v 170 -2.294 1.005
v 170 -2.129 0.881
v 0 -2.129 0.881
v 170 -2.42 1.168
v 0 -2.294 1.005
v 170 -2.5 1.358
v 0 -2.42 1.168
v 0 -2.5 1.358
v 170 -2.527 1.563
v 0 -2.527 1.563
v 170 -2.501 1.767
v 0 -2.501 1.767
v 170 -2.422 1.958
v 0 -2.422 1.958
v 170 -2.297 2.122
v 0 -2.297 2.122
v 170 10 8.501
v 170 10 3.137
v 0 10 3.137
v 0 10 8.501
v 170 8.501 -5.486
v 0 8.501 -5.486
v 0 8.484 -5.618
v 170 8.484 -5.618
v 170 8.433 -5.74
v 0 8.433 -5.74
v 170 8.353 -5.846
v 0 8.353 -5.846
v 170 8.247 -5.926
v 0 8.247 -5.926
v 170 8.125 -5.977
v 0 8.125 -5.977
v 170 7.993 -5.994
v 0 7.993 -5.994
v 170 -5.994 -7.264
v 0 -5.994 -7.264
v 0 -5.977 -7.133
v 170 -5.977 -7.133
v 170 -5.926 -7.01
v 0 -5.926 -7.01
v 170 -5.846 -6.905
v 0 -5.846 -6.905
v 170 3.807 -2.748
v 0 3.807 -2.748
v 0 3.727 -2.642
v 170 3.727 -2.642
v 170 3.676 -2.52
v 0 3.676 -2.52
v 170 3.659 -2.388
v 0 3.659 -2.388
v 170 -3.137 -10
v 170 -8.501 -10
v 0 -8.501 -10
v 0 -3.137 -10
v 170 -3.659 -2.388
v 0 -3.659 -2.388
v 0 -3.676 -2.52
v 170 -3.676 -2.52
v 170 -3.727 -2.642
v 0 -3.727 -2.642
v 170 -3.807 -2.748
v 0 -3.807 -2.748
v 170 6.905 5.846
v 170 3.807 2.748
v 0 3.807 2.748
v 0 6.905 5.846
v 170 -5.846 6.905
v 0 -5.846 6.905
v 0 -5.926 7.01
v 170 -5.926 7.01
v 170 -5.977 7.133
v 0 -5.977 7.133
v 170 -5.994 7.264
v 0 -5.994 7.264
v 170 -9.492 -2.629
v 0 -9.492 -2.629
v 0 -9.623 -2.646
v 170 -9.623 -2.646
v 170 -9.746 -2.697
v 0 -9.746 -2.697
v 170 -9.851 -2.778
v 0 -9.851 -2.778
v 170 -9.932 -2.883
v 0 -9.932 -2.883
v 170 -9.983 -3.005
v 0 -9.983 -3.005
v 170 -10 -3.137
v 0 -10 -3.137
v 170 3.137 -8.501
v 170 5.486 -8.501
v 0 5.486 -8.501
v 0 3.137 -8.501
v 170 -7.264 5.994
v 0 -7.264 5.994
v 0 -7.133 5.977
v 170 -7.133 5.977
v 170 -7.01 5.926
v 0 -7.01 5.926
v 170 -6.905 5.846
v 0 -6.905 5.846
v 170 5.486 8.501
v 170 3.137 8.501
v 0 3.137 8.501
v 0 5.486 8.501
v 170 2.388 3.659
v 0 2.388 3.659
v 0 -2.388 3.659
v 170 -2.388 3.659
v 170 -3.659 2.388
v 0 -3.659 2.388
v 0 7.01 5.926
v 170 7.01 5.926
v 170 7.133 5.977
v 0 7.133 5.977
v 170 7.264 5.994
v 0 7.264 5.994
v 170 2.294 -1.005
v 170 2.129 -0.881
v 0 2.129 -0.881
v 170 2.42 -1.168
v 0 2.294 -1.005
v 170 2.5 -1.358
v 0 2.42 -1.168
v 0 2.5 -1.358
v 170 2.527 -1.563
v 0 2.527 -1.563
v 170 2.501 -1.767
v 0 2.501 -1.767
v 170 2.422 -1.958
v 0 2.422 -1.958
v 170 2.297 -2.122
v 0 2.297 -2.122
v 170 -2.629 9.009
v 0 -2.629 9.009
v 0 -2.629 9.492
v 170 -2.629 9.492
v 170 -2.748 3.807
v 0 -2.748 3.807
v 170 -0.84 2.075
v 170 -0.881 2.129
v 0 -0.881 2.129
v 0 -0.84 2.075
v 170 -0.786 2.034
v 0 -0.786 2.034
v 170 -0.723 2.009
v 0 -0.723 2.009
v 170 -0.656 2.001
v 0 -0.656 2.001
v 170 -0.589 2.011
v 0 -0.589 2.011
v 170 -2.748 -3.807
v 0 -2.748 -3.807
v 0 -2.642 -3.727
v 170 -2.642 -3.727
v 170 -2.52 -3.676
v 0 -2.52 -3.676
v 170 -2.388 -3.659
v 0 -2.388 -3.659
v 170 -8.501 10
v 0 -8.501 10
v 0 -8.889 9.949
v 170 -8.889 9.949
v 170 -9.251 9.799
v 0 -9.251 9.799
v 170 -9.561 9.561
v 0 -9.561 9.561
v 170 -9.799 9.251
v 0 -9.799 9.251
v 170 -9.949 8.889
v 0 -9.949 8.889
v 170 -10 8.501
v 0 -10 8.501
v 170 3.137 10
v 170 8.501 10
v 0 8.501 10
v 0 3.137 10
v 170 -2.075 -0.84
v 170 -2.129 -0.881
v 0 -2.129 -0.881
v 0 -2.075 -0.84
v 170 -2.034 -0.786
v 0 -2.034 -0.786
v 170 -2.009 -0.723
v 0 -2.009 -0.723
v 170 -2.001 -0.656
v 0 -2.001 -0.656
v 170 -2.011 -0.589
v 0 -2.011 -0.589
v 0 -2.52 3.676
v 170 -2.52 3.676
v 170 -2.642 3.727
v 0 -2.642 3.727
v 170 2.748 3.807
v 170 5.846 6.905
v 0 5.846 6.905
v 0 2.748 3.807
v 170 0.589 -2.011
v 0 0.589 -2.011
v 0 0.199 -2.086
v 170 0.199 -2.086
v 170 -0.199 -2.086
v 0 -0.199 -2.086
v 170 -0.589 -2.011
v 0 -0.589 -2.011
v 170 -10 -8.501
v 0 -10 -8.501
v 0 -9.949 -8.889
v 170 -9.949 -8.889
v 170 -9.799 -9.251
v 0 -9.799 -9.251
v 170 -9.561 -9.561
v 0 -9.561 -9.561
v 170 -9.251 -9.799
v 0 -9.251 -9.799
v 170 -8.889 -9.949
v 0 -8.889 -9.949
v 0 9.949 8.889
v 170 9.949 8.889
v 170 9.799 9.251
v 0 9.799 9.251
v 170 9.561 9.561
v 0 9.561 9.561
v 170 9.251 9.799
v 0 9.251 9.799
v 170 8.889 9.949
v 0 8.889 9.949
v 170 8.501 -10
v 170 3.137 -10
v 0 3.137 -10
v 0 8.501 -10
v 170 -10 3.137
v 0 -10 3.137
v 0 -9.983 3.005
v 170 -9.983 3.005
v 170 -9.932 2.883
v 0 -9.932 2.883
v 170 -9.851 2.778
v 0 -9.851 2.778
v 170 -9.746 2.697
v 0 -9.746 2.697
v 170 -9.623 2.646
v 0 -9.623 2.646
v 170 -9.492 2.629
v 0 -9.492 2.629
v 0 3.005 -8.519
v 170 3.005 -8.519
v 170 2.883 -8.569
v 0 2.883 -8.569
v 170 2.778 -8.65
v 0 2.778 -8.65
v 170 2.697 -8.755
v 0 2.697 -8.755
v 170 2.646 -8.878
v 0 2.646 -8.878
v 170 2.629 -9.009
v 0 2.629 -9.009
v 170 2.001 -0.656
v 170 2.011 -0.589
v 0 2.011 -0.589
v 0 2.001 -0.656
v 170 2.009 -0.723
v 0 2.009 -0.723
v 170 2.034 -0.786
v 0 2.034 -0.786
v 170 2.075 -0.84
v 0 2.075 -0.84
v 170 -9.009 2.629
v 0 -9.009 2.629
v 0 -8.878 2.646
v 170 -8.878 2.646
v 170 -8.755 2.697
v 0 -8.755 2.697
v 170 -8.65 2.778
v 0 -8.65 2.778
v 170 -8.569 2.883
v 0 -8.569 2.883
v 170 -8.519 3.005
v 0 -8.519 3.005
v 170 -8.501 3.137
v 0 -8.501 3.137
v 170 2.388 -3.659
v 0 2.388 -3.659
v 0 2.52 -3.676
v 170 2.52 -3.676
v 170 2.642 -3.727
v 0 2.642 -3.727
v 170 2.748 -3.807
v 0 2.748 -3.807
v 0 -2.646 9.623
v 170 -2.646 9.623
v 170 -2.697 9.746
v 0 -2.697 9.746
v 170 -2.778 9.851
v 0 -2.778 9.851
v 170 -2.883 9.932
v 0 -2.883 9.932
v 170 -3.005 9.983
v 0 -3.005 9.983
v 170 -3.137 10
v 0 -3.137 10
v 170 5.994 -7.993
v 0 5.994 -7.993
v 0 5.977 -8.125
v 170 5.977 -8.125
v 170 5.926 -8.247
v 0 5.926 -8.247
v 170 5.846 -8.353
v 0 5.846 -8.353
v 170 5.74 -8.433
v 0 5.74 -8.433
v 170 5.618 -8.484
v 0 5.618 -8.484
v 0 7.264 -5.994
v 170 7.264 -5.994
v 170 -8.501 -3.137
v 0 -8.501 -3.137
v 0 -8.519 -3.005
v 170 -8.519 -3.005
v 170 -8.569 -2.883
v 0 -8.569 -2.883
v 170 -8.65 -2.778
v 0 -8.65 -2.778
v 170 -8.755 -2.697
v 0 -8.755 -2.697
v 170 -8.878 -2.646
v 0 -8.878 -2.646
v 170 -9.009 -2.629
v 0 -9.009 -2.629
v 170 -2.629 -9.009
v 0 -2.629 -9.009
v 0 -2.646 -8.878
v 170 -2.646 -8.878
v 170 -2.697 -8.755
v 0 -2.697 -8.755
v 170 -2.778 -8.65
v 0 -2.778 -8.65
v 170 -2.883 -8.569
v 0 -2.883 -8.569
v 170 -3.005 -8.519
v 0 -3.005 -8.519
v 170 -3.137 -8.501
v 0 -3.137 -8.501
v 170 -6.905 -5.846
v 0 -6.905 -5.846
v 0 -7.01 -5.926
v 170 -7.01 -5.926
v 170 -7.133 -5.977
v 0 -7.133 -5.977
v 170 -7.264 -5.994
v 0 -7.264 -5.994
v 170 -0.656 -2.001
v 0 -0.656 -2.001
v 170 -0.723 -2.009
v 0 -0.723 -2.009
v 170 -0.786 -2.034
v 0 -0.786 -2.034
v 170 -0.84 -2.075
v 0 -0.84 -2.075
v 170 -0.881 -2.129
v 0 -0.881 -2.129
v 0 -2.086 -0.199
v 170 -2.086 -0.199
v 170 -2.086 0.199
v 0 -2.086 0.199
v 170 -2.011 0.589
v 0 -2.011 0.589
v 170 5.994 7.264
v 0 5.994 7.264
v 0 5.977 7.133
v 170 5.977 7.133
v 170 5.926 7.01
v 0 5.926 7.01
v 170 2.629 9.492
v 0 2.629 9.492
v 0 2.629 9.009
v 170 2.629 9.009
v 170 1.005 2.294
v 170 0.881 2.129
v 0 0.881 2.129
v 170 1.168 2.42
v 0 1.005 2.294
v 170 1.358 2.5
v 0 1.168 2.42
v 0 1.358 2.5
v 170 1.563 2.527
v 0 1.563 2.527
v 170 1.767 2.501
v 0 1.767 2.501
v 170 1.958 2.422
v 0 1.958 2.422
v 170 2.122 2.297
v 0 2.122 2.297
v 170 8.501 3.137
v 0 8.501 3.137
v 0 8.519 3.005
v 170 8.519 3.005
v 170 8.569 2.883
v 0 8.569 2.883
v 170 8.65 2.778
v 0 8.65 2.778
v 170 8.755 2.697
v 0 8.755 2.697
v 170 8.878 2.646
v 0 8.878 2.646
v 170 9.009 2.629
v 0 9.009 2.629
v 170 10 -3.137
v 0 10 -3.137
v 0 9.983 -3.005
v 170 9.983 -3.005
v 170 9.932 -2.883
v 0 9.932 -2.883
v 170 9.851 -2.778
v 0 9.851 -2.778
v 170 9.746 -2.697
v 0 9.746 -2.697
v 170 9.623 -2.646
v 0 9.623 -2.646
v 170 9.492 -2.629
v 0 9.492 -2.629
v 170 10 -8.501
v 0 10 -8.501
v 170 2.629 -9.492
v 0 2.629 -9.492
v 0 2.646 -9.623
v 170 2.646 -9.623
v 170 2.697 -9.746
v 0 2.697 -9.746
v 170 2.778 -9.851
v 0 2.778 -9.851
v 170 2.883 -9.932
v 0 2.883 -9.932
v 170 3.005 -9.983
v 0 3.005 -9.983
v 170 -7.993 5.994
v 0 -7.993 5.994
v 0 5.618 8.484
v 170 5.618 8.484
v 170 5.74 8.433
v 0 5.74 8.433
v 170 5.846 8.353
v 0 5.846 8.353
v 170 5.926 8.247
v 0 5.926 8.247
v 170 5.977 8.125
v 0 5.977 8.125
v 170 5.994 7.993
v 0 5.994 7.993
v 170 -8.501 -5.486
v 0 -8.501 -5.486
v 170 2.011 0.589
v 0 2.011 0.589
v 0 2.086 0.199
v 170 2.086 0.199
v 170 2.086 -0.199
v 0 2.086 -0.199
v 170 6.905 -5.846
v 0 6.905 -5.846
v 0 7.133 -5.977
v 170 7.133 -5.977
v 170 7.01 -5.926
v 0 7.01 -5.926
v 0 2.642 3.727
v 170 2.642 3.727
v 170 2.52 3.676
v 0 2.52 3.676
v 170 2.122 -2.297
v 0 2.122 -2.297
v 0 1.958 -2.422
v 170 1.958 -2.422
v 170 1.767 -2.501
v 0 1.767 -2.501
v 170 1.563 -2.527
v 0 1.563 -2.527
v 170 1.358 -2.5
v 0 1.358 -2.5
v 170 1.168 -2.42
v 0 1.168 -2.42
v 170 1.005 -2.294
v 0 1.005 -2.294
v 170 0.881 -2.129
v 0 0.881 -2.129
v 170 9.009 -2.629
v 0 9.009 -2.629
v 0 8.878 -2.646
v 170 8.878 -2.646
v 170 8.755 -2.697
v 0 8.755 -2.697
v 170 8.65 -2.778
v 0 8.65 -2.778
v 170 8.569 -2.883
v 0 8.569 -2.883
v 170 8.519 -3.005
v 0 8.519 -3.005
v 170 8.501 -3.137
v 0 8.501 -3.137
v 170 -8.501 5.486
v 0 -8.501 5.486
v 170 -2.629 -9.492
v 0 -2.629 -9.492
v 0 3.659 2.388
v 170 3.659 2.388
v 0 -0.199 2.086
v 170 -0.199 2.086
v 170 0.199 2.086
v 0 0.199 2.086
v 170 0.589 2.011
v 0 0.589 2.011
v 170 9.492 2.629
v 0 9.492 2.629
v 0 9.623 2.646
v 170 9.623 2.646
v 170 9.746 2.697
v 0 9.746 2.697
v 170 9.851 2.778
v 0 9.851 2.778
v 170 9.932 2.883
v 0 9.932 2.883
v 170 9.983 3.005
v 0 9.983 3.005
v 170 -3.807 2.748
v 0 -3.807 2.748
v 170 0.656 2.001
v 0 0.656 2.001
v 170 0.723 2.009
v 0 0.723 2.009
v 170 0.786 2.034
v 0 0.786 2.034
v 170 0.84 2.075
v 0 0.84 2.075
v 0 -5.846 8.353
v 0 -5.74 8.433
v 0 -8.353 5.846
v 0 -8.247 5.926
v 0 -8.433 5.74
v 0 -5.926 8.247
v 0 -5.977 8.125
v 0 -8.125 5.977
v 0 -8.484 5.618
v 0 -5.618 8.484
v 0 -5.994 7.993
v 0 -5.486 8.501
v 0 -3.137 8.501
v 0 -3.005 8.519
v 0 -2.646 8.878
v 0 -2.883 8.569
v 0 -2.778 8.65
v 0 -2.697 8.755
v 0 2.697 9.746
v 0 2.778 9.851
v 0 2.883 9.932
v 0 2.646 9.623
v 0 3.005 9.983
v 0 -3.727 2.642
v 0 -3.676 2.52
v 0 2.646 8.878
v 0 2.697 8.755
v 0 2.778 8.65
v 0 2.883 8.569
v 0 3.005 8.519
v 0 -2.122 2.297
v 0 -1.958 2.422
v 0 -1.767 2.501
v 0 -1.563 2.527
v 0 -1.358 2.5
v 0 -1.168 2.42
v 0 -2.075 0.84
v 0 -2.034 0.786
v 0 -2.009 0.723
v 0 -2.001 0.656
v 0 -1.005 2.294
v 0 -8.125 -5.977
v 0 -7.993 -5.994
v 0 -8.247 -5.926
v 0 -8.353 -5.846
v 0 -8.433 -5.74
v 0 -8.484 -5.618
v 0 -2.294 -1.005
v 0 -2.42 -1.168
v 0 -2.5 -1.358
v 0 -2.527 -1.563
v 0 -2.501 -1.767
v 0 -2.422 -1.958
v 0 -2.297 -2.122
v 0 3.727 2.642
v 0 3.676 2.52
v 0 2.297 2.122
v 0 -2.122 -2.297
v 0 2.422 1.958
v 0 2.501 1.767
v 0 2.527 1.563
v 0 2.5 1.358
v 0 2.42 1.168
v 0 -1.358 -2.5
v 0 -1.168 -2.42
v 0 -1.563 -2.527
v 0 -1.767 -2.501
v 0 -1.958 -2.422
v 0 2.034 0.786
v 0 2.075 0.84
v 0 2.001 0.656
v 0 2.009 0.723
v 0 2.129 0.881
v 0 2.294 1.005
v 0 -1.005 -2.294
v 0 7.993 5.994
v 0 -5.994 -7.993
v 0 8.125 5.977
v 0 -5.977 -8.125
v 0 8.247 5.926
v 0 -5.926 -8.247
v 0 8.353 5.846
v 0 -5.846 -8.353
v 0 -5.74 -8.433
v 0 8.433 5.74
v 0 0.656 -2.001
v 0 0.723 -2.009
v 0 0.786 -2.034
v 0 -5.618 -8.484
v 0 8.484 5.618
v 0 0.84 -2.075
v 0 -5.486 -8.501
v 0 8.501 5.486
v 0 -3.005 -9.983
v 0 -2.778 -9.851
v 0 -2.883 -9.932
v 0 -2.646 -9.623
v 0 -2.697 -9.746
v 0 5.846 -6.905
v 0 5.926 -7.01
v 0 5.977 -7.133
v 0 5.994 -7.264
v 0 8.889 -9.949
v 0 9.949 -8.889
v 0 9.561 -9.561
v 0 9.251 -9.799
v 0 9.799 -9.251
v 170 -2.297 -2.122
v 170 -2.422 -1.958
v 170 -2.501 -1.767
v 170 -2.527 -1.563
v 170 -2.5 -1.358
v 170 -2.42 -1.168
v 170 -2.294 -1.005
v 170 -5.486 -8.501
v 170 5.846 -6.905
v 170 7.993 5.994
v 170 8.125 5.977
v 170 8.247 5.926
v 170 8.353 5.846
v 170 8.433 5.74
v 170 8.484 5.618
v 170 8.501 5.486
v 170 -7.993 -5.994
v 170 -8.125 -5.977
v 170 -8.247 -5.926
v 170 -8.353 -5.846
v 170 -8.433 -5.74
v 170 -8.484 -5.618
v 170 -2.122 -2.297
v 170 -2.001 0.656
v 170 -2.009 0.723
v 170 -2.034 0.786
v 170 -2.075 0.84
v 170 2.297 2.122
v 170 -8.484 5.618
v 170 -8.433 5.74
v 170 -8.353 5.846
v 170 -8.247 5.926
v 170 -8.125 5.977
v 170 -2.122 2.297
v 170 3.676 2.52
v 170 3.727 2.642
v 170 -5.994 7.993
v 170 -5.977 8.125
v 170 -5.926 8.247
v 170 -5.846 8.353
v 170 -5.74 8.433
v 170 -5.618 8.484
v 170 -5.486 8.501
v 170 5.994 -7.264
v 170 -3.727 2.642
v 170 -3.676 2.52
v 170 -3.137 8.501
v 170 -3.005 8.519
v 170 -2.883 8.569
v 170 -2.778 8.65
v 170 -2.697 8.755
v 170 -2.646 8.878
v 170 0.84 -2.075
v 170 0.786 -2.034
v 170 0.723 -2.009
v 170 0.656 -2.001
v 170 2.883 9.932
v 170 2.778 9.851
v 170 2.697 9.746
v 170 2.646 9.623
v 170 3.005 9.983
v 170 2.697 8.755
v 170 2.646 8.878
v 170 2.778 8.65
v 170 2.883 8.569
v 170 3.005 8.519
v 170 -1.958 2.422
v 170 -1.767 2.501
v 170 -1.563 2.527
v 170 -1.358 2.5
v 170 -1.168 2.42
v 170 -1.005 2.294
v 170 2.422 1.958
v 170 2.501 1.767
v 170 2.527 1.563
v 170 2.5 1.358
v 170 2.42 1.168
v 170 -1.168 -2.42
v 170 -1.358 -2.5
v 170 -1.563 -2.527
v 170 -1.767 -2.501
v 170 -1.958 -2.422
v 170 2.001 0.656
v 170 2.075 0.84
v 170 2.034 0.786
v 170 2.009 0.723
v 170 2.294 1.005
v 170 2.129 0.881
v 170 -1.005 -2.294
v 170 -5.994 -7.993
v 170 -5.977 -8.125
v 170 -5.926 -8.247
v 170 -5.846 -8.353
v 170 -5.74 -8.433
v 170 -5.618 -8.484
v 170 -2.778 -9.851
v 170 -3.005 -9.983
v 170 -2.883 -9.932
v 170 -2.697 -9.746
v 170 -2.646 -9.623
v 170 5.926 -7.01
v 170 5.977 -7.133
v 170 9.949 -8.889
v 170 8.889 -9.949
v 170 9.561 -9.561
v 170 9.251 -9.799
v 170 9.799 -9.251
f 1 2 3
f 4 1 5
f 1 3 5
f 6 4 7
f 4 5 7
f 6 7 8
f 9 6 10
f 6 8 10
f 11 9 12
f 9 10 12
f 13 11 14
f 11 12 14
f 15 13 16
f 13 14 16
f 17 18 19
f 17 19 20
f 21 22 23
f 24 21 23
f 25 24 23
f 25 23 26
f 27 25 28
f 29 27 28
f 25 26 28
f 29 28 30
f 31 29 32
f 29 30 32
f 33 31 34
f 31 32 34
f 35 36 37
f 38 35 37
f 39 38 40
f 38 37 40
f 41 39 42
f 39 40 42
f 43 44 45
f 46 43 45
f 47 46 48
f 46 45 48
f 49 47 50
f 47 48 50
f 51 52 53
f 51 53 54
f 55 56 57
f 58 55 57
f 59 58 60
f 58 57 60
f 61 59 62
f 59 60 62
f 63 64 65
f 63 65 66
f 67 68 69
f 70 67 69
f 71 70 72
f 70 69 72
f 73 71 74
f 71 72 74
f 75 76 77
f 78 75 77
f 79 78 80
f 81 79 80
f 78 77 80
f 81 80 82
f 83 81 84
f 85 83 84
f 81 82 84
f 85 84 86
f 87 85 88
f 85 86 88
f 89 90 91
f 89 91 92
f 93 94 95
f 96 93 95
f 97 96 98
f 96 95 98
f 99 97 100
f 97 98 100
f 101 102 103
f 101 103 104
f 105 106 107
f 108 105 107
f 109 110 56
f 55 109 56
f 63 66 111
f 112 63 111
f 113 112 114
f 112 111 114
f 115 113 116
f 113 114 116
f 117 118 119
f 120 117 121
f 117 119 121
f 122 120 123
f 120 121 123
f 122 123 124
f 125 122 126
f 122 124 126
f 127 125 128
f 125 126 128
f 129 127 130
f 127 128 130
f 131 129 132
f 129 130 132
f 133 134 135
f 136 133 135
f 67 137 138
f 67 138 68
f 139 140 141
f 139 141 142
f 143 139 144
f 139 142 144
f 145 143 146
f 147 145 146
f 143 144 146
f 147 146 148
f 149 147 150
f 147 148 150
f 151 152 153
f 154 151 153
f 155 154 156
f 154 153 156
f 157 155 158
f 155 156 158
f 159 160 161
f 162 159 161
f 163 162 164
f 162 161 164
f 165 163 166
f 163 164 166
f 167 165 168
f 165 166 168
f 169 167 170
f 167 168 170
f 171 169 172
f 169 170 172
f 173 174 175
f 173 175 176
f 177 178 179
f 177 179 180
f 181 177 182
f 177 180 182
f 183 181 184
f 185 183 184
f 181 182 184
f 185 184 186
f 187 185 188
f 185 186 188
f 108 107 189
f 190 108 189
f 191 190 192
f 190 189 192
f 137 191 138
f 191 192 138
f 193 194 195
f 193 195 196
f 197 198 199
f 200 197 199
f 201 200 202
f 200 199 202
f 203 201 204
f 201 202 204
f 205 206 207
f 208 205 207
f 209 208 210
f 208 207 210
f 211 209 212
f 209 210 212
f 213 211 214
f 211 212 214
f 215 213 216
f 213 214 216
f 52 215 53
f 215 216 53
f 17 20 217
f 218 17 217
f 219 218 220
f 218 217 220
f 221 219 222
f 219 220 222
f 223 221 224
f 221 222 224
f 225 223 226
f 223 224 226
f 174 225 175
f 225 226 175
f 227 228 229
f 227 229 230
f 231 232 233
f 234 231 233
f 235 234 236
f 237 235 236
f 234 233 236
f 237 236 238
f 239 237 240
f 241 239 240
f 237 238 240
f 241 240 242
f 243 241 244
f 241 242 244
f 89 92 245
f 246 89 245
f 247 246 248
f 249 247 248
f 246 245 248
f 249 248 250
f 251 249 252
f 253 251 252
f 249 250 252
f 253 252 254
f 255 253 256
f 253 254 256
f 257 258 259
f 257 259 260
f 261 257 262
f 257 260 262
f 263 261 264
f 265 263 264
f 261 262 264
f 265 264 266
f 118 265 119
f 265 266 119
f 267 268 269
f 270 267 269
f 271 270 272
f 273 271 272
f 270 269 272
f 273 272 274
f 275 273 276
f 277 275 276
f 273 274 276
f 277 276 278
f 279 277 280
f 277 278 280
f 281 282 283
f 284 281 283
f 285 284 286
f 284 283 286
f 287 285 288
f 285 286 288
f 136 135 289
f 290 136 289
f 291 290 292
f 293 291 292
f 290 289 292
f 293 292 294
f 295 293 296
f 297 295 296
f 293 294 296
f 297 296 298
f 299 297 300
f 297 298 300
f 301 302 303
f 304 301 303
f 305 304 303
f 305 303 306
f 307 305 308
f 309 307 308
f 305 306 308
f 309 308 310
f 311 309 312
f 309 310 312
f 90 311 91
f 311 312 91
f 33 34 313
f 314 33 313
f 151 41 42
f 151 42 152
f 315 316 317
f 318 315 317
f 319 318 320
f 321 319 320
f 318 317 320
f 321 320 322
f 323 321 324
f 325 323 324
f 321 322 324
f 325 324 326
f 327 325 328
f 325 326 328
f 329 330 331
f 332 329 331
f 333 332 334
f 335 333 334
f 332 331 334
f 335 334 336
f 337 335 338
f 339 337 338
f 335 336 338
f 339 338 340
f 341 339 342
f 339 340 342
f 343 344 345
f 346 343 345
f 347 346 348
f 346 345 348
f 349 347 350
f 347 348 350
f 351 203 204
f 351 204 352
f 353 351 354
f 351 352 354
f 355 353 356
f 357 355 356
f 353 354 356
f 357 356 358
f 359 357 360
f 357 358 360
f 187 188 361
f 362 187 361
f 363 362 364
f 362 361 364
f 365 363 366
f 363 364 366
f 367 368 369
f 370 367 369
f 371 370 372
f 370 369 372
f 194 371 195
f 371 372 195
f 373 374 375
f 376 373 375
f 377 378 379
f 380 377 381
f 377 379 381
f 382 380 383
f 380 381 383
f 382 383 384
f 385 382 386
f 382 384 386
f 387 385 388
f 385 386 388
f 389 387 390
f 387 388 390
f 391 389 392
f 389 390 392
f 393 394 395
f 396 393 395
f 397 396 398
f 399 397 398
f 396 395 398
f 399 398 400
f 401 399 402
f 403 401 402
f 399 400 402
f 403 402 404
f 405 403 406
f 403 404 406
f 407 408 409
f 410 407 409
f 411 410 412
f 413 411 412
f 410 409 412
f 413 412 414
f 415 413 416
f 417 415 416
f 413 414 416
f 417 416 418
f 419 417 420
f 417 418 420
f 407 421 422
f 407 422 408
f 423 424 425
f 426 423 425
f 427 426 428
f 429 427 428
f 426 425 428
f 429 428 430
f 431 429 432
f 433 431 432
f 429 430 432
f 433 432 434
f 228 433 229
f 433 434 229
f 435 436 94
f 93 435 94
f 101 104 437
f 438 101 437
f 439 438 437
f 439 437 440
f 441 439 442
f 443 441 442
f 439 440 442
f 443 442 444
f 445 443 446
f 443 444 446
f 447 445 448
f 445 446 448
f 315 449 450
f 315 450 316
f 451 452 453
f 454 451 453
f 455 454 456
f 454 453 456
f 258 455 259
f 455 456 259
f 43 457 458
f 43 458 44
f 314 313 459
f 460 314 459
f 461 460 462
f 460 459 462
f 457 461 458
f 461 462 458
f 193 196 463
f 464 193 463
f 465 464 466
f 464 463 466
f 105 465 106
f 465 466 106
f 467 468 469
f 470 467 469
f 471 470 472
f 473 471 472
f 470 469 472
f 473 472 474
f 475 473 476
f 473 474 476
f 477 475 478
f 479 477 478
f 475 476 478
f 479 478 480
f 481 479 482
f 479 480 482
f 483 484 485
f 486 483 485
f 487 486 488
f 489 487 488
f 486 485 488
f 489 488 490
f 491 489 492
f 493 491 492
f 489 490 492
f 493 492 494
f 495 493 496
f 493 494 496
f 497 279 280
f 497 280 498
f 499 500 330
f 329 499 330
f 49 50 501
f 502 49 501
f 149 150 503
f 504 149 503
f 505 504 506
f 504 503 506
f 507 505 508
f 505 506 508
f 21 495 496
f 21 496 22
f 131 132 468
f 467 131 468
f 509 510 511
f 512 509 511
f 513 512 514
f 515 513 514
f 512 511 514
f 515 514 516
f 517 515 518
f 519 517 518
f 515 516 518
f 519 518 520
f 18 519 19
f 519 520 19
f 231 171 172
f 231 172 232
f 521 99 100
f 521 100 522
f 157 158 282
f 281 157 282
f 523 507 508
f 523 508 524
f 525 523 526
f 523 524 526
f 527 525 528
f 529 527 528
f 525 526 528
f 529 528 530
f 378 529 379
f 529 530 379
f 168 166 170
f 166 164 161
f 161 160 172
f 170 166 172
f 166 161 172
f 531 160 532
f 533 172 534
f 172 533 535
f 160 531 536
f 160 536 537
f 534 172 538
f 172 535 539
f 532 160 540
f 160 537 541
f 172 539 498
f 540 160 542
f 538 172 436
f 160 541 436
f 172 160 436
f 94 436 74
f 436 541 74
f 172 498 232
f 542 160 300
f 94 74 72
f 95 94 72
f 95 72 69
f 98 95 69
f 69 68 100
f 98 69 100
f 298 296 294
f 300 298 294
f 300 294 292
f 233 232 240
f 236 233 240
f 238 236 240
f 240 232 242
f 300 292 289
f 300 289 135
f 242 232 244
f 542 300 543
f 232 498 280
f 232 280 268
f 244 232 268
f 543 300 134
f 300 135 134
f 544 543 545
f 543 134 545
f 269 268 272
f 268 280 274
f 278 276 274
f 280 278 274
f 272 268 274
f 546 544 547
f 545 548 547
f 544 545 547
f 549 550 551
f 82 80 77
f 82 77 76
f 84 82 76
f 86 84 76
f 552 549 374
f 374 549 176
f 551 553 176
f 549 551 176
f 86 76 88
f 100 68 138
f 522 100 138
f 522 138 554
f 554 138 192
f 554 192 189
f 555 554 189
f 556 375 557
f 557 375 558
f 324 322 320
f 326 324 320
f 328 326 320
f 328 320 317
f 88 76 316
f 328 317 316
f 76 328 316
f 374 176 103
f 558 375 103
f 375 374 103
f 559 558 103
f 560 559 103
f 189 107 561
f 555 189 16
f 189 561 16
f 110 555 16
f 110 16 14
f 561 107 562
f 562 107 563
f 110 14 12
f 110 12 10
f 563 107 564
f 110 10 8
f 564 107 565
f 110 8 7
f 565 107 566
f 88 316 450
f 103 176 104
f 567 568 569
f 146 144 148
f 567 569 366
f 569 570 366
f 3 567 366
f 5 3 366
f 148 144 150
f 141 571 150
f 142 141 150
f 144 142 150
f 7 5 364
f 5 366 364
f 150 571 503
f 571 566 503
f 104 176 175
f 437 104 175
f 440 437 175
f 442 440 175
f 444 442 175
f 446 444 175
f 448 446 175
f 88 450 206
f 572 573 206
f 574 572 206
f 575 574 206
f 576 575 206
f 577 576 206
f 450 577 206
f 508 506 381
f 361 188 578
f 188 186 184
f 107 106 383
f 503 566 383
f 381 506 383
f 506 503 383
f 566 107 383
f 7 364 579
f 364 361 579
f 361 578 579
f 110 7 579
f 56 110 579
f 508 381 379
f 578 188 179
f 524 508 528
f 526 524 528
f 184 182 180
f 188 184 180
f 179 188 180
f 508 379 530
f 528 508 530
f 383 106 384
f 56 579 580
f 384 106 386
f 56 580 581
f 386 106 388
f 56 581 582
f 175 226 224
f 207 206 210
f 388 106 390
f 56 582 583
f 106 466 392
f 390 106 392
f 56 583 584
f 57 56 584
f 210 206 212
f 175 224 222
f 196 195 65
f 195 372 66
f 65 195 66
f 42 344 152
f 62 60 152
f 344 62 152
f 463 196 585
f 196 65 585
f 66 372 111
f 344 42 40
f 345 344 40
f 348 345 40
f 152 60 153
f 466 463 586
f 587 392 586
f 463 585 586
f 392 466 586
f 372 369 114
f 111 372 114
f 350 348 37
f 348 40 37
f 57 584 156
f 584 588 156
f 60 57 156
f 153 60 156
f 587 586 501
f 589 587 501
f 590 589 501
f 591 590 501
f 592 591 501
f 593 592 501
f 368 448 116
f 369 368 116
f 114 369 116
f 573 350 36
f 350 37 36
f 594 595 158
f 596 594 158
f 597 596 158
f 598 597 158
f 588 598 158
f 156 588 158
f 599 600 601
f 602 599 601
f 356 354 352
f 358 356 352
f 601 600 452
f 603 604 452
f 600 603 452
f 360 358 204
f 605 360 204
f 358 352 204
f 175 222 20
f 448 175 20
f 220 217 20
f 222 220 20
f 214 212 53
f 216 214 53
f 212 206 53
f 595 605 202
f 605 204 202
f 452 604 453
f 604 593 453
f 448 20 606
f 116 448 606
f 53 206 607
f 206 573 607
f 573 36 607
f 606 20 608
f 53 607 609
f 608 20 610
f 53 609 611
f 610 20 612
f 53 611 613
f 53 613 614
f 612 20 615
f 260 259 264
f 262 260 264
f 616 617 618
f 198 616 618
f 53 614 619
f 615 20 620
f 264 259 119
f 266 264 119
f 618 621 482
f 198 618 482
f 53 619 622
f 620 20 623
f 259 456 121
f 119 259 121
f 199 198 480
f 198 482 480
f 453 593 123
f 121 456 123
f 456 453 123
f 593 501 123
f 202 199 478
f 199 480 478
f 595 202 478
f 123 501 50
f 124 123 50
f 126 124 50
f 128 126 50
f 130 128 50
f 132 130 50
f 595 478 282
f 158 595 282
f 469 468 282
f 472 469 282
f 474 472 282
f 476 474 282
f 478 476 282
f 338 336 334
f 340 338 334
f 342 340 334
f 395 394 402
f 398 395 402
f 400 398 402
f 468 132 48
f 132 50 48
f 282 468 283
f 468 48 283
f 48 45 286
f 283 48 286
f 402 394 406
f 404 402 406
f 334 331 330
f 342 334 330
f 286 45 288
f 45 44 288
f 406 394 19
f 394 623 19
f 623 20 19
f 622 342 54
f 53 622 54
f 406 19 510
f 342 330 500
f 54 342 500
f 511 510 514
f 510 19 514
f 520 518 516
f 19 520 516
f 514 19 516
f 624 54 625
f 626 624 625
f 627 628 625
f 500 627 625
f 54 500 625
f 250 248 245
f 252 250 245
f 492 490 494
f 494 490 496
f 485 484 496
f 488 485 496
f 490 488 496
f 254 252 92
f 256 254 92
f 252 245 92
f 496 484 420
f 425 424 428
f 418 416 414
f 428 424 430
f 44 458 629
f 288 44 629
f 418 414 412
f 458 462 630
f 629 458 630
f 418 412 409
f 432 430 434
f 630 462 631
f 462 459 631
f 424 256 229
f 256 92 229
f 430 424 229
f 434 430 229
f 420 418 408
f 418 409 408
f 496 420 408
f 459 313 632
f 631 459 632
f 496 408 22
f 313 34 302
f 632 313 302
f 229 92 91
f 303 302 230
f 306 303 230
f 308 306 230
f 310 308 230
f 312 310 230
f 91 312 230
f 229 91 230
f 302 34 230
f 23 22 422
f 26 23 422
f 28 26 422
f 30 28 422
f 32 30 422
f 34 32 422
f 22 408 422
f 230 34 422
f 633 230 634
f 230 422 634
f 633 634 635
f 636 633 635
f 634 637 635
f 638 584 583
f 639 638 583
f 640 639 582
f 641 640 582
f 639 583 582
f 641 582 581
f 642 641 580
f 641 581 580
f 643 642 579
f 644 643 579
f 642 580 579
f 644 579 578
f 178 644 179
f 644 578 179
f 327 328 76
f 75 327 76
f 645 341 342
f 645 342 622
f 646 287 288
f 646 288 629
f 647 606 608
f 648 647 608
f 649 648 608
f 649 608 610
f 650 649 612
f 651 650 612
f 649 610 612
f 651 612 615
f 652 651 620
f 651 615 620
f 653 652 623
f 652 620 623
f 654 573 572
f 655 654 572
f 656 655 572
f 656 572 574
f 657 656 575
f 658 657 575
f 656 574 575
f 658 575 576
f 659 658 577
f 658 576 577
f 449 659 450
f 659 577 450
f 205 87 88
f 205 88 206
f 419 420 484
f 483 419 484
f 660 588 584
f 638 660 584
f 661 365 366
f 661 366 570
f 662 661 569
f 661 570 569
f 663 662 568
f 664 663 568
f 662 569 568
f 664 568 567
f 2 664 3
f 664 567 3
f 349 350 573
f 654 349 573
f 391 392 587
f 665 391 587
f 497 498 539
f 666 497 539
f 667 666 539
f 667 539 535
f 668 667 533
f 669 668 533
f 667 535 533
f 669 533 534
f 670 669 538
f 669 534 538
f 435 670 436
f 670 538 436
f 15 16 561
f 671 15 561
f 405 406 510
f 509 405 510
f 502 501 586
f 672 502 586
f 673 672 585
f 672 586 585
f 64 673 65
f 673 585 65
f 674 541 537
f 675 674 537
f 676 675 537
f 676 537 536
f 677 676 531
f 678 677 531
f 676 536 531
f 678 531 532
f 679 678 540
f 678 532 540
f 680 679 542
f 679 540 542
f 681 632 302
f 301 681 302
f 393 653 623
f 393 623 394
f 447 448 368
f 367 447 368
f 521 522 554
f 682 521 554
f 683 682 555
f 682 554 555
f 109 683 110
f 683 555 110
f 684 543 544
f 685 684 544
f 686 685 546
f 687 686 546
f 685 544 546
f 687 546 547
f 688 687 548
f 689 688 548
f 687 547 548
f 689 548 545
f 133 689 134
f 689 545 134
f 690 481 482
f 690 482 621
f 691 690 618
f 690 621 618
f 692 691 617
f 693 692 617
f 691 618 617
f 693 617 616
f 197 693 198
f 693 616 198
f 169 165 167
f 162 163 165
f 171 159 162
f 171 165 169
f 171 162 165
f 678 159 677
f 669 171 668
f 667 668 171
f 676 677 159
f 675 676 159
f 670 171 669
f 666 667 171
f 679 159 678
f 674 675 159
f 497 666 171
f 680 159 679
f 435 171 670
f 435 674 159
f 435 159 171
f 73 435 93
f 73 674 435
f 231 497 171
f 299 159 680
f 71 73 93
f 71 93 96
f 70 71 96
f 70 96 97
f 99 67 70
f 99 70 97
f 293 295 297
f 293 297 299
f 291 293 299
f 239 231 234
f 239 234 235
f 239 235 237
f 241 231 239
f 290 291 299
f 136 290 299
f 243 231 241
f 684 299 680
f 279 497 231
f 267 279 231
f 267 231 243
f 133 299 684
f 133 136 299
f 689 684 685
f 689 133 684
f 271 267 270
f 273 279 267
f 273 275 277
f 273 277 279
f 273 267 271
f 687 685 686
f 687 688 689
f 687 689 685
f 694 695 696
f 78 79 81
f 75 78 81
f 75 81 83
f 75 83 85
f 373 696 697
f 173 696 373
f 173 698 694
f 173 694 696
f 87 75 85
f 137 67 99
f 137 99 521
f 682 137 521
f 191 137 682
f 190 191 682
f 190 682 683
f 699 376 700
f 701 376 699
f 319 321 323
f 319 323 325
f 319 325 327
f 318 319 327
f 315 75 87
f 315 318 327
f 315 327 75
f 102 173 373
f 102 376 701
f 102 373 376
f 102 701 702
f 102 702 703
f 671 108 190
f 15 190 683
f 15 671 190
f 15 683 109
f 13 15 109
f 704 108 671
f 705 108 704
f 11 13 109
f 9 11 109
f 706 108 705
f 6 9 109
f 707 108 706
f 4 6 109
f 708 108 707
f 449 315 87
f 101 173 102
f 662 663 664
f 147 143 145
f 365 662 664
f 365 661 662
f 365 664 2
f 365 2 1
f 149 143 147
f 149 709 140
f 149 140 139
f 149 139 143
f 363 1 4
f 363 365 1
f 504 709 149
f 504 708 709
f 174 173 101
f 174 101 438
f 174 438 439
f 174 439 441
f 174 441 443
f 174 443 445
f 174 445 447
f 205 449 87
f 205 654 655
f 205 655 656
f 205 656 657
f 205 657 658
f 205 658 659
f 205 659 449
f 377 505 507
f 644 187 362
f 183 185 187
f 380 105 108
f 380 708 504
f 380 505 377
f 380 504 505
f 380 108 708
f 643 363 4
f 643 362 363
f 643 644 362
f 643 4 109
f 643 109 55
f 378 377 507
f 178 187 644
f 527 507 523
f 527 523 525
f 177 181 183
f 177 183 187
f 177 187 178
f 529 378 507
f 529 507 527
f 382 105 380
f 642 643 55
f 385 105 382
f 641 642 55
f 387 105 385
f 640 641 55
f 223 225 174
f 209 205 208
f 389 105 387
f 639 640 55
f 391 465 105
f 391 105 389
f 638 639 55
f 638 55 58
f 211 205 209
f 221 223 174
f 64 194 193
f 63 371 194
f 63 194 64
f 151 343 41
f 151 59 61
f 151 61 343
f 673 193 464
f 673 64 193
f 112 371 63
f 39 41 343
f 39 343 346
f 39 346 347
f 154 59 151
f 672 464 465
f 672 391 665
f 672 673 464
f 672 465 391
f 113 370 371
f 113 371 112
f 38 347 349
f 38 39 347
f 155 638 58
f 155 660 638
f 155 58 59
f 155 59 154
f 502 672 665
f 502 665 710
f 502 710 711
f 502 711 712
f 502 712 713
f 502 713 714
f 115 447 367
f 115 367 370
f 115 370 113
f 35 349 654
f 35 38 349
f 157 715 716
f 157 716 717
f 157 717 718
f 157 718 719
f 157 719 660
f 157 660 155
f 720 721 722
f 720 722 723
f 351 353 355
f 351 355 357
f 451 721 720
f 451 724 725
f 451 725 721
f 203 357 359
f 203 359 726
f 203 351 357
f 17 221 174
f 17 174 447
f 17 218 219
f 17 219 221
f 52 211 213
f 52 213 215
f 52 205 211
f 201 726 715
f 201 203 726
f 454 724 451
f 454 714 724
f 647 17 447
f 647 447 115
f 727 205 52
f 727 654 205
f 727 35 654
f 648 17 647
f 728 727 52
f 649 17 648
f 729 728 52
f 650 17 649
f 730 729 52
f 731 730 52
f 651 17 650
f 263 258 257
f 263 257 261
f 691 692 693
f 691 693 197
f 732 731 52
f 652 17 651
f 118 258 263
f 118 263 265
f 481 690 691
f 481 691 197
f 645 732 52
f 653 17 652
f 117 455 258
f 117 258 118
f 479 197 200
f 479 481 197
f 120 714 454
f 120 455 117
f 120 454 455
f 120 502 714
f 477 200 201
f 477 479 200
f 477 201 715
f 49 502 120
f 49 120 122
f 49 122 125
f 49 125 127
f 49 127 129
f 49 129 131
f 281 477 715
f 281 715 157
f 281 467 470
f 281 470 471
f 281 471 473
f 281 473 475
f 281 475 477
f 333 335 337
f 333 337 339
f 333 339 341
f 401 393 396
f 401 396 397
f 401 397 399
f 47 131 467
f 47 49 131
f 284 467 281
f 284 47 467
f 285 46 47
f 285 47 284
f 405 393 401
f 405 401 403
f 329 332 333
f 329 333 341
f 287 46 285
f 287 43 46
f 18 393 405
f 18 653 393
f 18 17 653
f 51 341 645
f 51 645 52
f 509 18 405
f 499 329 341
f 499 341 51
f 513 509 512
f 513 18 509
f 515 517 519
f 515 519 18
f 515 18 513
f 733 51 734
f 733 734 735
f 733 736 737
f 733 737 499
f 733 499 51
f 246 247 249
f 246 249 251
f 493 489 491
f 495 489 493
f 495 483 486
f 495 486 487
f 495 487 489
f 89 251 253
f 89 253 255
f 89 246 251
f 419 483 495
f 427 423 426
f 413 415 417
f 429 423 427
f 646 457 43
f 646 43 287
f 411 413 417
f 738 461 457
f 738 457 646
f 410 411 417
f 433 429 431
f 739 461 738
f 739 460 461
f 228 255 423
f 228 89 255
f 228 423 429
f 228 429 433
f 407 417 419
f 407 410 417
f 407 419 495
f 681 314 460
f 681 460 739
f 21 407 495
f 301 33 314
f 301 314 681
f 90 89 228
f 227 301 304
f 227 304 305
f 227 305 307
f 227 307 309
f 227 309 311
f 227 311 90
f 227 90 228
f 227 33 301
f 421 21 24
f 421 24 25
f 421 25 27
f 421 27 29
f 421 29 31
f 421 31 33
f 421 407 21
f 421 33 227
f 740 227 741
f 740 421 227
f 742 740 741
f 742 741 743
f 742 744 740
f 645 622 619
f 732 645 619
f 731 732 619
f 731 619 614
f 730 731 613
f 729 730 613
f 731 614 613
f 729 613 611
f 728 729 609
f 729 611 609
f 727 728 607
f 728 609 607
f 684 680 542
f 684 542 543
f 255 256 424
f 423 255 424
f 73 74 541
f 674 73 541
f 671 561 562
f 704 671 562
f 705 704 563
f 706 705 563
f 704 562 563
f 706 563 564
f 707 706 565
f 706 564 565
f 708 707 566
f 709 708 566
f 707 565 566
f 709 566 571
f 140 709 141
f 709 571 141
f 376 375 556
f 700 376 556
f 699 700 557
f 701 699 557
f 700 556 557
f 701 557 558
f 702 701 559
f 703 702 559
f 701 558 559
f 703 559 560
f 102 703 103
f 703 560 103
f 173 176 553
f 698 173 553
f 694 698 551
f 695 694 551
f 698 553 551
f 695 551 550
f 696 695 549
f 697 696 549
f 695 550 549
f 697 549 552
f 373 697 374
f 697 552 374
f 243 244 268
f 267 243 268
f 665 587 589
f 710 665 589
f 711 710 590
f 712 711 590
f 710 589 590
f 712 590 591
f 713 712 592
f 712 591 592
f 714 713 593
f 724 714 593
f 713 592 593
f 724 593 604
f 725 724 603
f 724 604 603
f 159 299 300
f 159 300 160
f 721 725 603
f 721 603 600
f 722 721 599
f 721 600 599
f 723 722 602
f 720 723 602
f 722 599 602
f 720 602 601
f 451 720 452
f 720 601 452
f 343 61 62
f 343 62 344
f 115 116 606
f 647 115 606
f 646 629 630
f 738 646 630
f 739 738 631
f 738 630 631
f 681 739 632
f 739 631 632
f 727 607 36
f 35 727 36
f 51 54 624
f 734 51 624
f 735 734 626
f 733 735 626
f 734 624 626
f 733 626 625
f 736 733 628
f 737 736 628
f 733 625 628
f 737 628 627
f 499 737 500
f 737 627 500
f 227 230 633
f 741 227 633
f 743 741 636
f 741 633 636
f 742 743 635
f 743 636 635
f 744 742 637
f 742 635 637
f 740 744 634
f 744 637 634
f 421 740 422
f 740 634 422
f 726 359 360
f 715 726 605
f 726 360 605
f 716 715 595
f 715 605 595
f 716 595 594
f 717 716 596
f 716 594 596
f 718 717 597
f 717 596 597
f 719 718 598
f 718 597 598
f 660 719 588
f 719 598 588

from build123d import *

# Parameters (mm, degrees)
F_20_SERIES_20_2020_1_DEPTH = 170


with BuildPart() as part:
    # Sketch11 → 20_series 20-2020(1) (new body)
    with BuildSketch(Plane(origin=(0, 0, 0), x_dir=(0, 0, -1), z_dir=(1, 0, 0))):
        with BuildLine():
            Line((9.0094, 2.6289), (9.492, 2.6289))
            ThreePointArc((9.492, 2.6289), (9.851210245, 2.777689755), (10, 3.1369))
            Line((10, 3.1369), (10, 8.5014))
            ThreePointArc((10, 8.5014), (9.561070222, 9.561070222), (8.5014, 10))
            Line((8.5014, 10), (3.1369, 10))
            ThreePointArc((3.1369, 10), (2.777689755, 9.851210245), (2.6289, 9.492))
            Line((2.6289, 9.492), (2.6289, 9.0094))
            ThreePointArc((2.6289, 9.0094), (2.777689755, 8.650189755), (3.1369, 8.5014))
            Line((3.1369, 8.5014), (5.4864, 8.5014))
            ThreePointArc((5.4864, 8.5014), (5.845610245, 8.352610245), (5.9944, 7.9934))
            Line((5.9944, 7.9934), (5.9944, 7.264490712))
            ThreePointArc((5.9944, 7.264490712), (5.955730803, 7.070087528), (5.845610245, 6.905280467))
            Line((5.845610245, 6.905280467), (2.747686782, 3.807357004))
            ThreePointArc((2.747686782, 3.807357004), (2.582879721, 3.697236446), (2.388476537, 3.658567249))
            Line((2.388476537, 3.658567249), (-2.388476537, 3.658567249))
            ThreePointArc((-2.388476537, 3.658567249), (-2.582879721, 3.697236446), (-2.747686782, 3.807357004))
            Line((-2.747686782, 3.807357004), (-5.845610245, 6.905280467))
            ThreePointArc((-5.845610245, 6.905280467), (-5.955730803, 7.070087528), (-5.9944, 7.264490712))
            Line((-5.9944, 7.264490712), (-5.9944, 7.9934))
            ThreePointArc((-5.9944, 7.9934), (-5.845610245, 8.352610245), (-5.4864, 8.5014))
            Line((-5.4864, 8.5014), (-3.1369, 8.5014))
            ThreePointArc((-3.1369, 8.5014), (-2.777689755, 8.650189755), (-2.6289, 9.0094))
            Line((-2.6289, 9.0094), (-2.6289, 9.492))
            ThreePointArc((-2.6289, 9.492), (-2.777689755, 9.851210245), (-3.1369, 10))
            Line((-3.1369, 10), (-8.5014, 10))
            ThreePointArc((-8.5014, 10), (-9.561070222, 9.561070222), (-10, 8.5014))
            Line((-10, 8.5014), (-10, 3.1369))
            ThreePointArc((-10, 3.1369), (-9.851210245, 2.777689755), (-9.492, 2.6289))
            Line((-9.492, 2.6289), (-9.0094, 2.6289))
            ThreePointArc((-9.0094, 2.6289), (-8.650189755, 2.777689755), (-8.5014, 3.1369))
            Line((-8.5014, 3.1369), (-8.5014, 5.4864))
            ThreePointArc((-8.5014, 5.4864), (-8.352610245, 5.845610245), (-7.9934, 5.9944))
            Line((-7.9934, 5.9944), (-7.264490712, 5.9944))
            ThreePointArc((-7.264490712, 5.9944), (-7.070087528, 5.955730803), (-6.905280467, 5.845610245))
            Line((-6.905280467, 5.845610245), (-3.807357004, 2.747686782))
            ThreePointArc((-3.807357004, 2.747686782), (-3.697236446, 2.582879721), (-3.658567249, 2.388476537))
            Line((-3.658567249, 2.388476537), (-3.658567249, -2.388476537))
            ThreePointArc((-3.658567249, -2.388476537), (-3.697236446, -2.582879721), (-3.807357004, -2.747686782))
            Line((-3.807357004, -2.747686782), (-6.905280467, -5.845610245))
            ThreePointArc((-6.905280467, -5.845610245), (-7.070087528, -5.955730803), (-7.264490712, -5.9944))
            Line((-7.264490712, -5.9944), (-7.9934, -5.9944))
            ThreePointArc((-7.9934, -5.9944), (-8.352610245, -5.845610245), (-8.5014, -5.4864))
            Line((-8.5014, -5.4864), (-8.5014, -3.1369))
            ThreePointArc((-8.5014, -3.1369), (-8.650189755, -2.777689755), (-9.0094, -2.6289))
            Line((-9.0094, -2.6289), (-9.492, -2.6289))
            ThreePointArc((-9.492, -2.6289), (-9.851210245, -2.777689755), (-10, -3.1369))
            Line((-10, -3.1369), (-10, -8.5014))
            ThreePointArc((-10, -8.5014), (-9.561070222, -9.561070222), (-8.5014, -10))
            Line((-8.5014, -10), (-3.1369, -10))
            ThreePointArc((-3.1369, -10), (-2.777689755, -9.851210245), (-2.6289, -9.492))
            Line((-2.6289, -9.492), (-2.6289, -9.0094))
            ThreePointArc((-2.6289, -9.0094), (-2.777689755, -8.650189755), (-3.1369, -8.5014))
            Line((-3.1369, -8.5014), (-5.4864, -8.5014))
            ThreePointArc((-5.4864, -8.5014), (-5.845610245, -8.352610245), (-5.9944, -7.9934))
            Line((-5.9944, -7.9934), (-5.9944, -7.264490712))
            ThreePointArc((-5.9944, -7.264490712), (-5.955730803, -7.070087528), (-5.845610245, -6.905280467))
            Line((-5.845610245, -6.905280467), (-2.747686782, -3.807357004))
            ThreePointArc((-2.747686782, -3.807357004), (-2.582879721, -3.697236446), (-2.388476537, -3.658567249))
            Line((-2.388476537, -3.658567249), (2.388476537, -3.658567249))
            ThreePointArc((2.388476537, -3.658567249), (2.582879721, -3.697236446), (2.747686782, -3.807357004))
            Line((2.747686782, -3.807357004), (5.845610245, -6.905280467))
            ThreePointArc((5.845610245, -6.905280467), (5.955730803, -7.070087528), (5.9944, -7.264490712))
            Line((5.9944, -7.264490712), (5.9944, -7.9934))
            ThreePointArc((5.9944, -7.9934), (5.845610245, -8.352610245), (5.4864, -8.5014))
            Line((5.4864, -8.5014), (3.1369, -8.5014))
            ThreePointArc((3.1369, -8.5014), (2.777689755, -8.650189755), (2.6289, -9.0094))
            Line((2.6289, -9.0094), (2.6289, -9.492))
            ThreePointArc((2.6289, -9.492), (2.777689755, -9.851210245), (3.1369, -10))
            Line((3.1369, -10), (8.5014, -10))
            ThreePointArc((8.5014, -10), (9.561070222, -9.561070222), (10, -8.5014))
            Line((10, -8.5014), (10, -3.1369))
            ThreePointArc((10, -3.1369), (9.851210245, -2.777689755), (9.492, -2.6289))
            Line((9.492, -2.6289), (9.0094, -2.6289))
            ThreePointArc((9.0094, -2.6289), (8.650189755, -2.777689755), (8.5014, -3.1369))
            Line((8.5014, -3.1369), (8.5014, -5.4864))
            ThreePointArc((8.5014, -5.4864), (8.352610245, -5.845610245), (7.9934, -5.9944))
            Line((7.9934, -5.9944), (7.264490712, -5.9944))
            ThreePointArc((7.264490712, -5.9944), (7.070087528, -5.955730803), (6.905280467, -5.845610245))
            Line((6.905280467, -5.845610245), (3.807357004, -2.747686782))
            ThreePointArc((3.807357004, -2.747686782), (3.697236446, -2.582879721), (3.658567249, -2.388476537))
            Line((3.658567249, -2.388476537), (3.658567249, 2.388476537))
            ThreePointArc((3.658567249, 2.388476537), (3.697236446, 2.582879721), (3.807357004, 2.747686782))
            Line((3.807357004, 2.747686782), (6.905280467, 5.845610245))
            ThreePointArc((6.905280467, 5.845610245), (7.070087528, 5.955730803), (7.264490712, 5.9944))
            Line((7.264490712, 5.9944), (7.9934, 5.9944))
            ThreePointArc((7.9934, 5.9944), (8.352610245, 5.845610245), (8.5014, 5.4864))
            Line((8.5014, 5.4864), (8.5014, 3.1369))
            ThreePointArc((8.5014, 3.1369), (8.650189755, 2.777689755), (9.0094, 2.6289))
        make_face()
        with BuildLine():
            Line((-2.296558466, 2.121727546), (-2.121727546, 2.296558466))
            ThreePointArc((-2.121727546, 2.296558466), (-1.459775814, 2.520126613), (-0.880635441, 2.129282347))
            ThreePointArc((-0.880635441, 2.129282347), (-0.755121693, 2.019456424), (-0.588548999, 2.011151493))
            ThreePointArc((-0.588548999, 2.011151493), (0, 2.0955), (0.588548999, 2.011151493))
            ThreePointArc((0.588548999, 2.011151493), (0.755121693, 2.019456424), (0.880635441, 2.129282347))
            ThreePointArc((0.880635441, 2.129282347), (1.459775814, 2.520126613), (2.121727546, 2.296558466))
            Line((2.121727546, 2.296558466), (2.296558466, 2.121727546))
            ThreePointArc((2.296558466, 2.121727546), (2.520126613, 1.459775814), (2.129282347, 0.880635441))
            ThreePointArc((2.129282347, 0.880635441), (2.019456424, 0.755121693), (2.011151493, 0.588548999))
            ThreePointArc((2.011151493, 0.588548999), (2.0955, 0), (2.011151493, -0.588548999))
            ThreePointArc((2.011151493, -0.588548999), (2.019456424, -0.755121693), (2.129282347, -0.880635441))
            ThreePointArc((2.129282347, -0.880635441), (2.520126613, -1.459775814), (2.296558466, -2.121727546))
            Line((2.296558466, -2.121727546), (2.121727546, -2.296558466))
            ThreePointArc((2.121727546, -2.296558466), (1.459775814, -2.520126613), (0.880635441, -2.129282347))
            ThreePointArc((0.880635441, -2.129282347), (0.755121693, -2.019456424), (0.588548999, -2.011151493))
            ThreePointArc((0.588548999, -2.011151493), (0, -2.0955), (-0.588548999, -2.011151493))
            ThreePointArc((-0.588548999, -2.011151493), (-0.755121693, -2.019456424), (-0.880635441, -2.129282347))
            ThreePointArc((-0.880635441, -2.129282347), (-1.459775814, -2.520126613), (-2.121727546, -2.296558466))
            Line((-2.121727546, -2.296558466), (-2.296558466, -2.121727546))
            ThreePointArc((-2.296558466, -2.121727546), (-2.520126613, -1.459775814), (-2.129282347, -0.880635441))
            ThreePointArc((-2.129282347, -0.880635441), (-2.019456424, -0.755121693), (-2.011151493, -0.588548999))
            ThreePointArc((-2.011151493, -0.588548999), (-2.0955, 0), (-2.011151493, 0.588548999))
            ThreePointArc((-2.011151493, 0.588548999), (-2.019456424, 0.755121693), (-2.129282347, 0.880635441))
            ThreePointArc((-2.129282347, 0.880635441), (-2.520126613, 1.459775814), (-2.296558466, 2.121727546))
        make_face(mode=Mode.SUBTRACT)
    extrude(amount=F_20_SERIES_20_2020_1_DEPTH)


solid = part.part
